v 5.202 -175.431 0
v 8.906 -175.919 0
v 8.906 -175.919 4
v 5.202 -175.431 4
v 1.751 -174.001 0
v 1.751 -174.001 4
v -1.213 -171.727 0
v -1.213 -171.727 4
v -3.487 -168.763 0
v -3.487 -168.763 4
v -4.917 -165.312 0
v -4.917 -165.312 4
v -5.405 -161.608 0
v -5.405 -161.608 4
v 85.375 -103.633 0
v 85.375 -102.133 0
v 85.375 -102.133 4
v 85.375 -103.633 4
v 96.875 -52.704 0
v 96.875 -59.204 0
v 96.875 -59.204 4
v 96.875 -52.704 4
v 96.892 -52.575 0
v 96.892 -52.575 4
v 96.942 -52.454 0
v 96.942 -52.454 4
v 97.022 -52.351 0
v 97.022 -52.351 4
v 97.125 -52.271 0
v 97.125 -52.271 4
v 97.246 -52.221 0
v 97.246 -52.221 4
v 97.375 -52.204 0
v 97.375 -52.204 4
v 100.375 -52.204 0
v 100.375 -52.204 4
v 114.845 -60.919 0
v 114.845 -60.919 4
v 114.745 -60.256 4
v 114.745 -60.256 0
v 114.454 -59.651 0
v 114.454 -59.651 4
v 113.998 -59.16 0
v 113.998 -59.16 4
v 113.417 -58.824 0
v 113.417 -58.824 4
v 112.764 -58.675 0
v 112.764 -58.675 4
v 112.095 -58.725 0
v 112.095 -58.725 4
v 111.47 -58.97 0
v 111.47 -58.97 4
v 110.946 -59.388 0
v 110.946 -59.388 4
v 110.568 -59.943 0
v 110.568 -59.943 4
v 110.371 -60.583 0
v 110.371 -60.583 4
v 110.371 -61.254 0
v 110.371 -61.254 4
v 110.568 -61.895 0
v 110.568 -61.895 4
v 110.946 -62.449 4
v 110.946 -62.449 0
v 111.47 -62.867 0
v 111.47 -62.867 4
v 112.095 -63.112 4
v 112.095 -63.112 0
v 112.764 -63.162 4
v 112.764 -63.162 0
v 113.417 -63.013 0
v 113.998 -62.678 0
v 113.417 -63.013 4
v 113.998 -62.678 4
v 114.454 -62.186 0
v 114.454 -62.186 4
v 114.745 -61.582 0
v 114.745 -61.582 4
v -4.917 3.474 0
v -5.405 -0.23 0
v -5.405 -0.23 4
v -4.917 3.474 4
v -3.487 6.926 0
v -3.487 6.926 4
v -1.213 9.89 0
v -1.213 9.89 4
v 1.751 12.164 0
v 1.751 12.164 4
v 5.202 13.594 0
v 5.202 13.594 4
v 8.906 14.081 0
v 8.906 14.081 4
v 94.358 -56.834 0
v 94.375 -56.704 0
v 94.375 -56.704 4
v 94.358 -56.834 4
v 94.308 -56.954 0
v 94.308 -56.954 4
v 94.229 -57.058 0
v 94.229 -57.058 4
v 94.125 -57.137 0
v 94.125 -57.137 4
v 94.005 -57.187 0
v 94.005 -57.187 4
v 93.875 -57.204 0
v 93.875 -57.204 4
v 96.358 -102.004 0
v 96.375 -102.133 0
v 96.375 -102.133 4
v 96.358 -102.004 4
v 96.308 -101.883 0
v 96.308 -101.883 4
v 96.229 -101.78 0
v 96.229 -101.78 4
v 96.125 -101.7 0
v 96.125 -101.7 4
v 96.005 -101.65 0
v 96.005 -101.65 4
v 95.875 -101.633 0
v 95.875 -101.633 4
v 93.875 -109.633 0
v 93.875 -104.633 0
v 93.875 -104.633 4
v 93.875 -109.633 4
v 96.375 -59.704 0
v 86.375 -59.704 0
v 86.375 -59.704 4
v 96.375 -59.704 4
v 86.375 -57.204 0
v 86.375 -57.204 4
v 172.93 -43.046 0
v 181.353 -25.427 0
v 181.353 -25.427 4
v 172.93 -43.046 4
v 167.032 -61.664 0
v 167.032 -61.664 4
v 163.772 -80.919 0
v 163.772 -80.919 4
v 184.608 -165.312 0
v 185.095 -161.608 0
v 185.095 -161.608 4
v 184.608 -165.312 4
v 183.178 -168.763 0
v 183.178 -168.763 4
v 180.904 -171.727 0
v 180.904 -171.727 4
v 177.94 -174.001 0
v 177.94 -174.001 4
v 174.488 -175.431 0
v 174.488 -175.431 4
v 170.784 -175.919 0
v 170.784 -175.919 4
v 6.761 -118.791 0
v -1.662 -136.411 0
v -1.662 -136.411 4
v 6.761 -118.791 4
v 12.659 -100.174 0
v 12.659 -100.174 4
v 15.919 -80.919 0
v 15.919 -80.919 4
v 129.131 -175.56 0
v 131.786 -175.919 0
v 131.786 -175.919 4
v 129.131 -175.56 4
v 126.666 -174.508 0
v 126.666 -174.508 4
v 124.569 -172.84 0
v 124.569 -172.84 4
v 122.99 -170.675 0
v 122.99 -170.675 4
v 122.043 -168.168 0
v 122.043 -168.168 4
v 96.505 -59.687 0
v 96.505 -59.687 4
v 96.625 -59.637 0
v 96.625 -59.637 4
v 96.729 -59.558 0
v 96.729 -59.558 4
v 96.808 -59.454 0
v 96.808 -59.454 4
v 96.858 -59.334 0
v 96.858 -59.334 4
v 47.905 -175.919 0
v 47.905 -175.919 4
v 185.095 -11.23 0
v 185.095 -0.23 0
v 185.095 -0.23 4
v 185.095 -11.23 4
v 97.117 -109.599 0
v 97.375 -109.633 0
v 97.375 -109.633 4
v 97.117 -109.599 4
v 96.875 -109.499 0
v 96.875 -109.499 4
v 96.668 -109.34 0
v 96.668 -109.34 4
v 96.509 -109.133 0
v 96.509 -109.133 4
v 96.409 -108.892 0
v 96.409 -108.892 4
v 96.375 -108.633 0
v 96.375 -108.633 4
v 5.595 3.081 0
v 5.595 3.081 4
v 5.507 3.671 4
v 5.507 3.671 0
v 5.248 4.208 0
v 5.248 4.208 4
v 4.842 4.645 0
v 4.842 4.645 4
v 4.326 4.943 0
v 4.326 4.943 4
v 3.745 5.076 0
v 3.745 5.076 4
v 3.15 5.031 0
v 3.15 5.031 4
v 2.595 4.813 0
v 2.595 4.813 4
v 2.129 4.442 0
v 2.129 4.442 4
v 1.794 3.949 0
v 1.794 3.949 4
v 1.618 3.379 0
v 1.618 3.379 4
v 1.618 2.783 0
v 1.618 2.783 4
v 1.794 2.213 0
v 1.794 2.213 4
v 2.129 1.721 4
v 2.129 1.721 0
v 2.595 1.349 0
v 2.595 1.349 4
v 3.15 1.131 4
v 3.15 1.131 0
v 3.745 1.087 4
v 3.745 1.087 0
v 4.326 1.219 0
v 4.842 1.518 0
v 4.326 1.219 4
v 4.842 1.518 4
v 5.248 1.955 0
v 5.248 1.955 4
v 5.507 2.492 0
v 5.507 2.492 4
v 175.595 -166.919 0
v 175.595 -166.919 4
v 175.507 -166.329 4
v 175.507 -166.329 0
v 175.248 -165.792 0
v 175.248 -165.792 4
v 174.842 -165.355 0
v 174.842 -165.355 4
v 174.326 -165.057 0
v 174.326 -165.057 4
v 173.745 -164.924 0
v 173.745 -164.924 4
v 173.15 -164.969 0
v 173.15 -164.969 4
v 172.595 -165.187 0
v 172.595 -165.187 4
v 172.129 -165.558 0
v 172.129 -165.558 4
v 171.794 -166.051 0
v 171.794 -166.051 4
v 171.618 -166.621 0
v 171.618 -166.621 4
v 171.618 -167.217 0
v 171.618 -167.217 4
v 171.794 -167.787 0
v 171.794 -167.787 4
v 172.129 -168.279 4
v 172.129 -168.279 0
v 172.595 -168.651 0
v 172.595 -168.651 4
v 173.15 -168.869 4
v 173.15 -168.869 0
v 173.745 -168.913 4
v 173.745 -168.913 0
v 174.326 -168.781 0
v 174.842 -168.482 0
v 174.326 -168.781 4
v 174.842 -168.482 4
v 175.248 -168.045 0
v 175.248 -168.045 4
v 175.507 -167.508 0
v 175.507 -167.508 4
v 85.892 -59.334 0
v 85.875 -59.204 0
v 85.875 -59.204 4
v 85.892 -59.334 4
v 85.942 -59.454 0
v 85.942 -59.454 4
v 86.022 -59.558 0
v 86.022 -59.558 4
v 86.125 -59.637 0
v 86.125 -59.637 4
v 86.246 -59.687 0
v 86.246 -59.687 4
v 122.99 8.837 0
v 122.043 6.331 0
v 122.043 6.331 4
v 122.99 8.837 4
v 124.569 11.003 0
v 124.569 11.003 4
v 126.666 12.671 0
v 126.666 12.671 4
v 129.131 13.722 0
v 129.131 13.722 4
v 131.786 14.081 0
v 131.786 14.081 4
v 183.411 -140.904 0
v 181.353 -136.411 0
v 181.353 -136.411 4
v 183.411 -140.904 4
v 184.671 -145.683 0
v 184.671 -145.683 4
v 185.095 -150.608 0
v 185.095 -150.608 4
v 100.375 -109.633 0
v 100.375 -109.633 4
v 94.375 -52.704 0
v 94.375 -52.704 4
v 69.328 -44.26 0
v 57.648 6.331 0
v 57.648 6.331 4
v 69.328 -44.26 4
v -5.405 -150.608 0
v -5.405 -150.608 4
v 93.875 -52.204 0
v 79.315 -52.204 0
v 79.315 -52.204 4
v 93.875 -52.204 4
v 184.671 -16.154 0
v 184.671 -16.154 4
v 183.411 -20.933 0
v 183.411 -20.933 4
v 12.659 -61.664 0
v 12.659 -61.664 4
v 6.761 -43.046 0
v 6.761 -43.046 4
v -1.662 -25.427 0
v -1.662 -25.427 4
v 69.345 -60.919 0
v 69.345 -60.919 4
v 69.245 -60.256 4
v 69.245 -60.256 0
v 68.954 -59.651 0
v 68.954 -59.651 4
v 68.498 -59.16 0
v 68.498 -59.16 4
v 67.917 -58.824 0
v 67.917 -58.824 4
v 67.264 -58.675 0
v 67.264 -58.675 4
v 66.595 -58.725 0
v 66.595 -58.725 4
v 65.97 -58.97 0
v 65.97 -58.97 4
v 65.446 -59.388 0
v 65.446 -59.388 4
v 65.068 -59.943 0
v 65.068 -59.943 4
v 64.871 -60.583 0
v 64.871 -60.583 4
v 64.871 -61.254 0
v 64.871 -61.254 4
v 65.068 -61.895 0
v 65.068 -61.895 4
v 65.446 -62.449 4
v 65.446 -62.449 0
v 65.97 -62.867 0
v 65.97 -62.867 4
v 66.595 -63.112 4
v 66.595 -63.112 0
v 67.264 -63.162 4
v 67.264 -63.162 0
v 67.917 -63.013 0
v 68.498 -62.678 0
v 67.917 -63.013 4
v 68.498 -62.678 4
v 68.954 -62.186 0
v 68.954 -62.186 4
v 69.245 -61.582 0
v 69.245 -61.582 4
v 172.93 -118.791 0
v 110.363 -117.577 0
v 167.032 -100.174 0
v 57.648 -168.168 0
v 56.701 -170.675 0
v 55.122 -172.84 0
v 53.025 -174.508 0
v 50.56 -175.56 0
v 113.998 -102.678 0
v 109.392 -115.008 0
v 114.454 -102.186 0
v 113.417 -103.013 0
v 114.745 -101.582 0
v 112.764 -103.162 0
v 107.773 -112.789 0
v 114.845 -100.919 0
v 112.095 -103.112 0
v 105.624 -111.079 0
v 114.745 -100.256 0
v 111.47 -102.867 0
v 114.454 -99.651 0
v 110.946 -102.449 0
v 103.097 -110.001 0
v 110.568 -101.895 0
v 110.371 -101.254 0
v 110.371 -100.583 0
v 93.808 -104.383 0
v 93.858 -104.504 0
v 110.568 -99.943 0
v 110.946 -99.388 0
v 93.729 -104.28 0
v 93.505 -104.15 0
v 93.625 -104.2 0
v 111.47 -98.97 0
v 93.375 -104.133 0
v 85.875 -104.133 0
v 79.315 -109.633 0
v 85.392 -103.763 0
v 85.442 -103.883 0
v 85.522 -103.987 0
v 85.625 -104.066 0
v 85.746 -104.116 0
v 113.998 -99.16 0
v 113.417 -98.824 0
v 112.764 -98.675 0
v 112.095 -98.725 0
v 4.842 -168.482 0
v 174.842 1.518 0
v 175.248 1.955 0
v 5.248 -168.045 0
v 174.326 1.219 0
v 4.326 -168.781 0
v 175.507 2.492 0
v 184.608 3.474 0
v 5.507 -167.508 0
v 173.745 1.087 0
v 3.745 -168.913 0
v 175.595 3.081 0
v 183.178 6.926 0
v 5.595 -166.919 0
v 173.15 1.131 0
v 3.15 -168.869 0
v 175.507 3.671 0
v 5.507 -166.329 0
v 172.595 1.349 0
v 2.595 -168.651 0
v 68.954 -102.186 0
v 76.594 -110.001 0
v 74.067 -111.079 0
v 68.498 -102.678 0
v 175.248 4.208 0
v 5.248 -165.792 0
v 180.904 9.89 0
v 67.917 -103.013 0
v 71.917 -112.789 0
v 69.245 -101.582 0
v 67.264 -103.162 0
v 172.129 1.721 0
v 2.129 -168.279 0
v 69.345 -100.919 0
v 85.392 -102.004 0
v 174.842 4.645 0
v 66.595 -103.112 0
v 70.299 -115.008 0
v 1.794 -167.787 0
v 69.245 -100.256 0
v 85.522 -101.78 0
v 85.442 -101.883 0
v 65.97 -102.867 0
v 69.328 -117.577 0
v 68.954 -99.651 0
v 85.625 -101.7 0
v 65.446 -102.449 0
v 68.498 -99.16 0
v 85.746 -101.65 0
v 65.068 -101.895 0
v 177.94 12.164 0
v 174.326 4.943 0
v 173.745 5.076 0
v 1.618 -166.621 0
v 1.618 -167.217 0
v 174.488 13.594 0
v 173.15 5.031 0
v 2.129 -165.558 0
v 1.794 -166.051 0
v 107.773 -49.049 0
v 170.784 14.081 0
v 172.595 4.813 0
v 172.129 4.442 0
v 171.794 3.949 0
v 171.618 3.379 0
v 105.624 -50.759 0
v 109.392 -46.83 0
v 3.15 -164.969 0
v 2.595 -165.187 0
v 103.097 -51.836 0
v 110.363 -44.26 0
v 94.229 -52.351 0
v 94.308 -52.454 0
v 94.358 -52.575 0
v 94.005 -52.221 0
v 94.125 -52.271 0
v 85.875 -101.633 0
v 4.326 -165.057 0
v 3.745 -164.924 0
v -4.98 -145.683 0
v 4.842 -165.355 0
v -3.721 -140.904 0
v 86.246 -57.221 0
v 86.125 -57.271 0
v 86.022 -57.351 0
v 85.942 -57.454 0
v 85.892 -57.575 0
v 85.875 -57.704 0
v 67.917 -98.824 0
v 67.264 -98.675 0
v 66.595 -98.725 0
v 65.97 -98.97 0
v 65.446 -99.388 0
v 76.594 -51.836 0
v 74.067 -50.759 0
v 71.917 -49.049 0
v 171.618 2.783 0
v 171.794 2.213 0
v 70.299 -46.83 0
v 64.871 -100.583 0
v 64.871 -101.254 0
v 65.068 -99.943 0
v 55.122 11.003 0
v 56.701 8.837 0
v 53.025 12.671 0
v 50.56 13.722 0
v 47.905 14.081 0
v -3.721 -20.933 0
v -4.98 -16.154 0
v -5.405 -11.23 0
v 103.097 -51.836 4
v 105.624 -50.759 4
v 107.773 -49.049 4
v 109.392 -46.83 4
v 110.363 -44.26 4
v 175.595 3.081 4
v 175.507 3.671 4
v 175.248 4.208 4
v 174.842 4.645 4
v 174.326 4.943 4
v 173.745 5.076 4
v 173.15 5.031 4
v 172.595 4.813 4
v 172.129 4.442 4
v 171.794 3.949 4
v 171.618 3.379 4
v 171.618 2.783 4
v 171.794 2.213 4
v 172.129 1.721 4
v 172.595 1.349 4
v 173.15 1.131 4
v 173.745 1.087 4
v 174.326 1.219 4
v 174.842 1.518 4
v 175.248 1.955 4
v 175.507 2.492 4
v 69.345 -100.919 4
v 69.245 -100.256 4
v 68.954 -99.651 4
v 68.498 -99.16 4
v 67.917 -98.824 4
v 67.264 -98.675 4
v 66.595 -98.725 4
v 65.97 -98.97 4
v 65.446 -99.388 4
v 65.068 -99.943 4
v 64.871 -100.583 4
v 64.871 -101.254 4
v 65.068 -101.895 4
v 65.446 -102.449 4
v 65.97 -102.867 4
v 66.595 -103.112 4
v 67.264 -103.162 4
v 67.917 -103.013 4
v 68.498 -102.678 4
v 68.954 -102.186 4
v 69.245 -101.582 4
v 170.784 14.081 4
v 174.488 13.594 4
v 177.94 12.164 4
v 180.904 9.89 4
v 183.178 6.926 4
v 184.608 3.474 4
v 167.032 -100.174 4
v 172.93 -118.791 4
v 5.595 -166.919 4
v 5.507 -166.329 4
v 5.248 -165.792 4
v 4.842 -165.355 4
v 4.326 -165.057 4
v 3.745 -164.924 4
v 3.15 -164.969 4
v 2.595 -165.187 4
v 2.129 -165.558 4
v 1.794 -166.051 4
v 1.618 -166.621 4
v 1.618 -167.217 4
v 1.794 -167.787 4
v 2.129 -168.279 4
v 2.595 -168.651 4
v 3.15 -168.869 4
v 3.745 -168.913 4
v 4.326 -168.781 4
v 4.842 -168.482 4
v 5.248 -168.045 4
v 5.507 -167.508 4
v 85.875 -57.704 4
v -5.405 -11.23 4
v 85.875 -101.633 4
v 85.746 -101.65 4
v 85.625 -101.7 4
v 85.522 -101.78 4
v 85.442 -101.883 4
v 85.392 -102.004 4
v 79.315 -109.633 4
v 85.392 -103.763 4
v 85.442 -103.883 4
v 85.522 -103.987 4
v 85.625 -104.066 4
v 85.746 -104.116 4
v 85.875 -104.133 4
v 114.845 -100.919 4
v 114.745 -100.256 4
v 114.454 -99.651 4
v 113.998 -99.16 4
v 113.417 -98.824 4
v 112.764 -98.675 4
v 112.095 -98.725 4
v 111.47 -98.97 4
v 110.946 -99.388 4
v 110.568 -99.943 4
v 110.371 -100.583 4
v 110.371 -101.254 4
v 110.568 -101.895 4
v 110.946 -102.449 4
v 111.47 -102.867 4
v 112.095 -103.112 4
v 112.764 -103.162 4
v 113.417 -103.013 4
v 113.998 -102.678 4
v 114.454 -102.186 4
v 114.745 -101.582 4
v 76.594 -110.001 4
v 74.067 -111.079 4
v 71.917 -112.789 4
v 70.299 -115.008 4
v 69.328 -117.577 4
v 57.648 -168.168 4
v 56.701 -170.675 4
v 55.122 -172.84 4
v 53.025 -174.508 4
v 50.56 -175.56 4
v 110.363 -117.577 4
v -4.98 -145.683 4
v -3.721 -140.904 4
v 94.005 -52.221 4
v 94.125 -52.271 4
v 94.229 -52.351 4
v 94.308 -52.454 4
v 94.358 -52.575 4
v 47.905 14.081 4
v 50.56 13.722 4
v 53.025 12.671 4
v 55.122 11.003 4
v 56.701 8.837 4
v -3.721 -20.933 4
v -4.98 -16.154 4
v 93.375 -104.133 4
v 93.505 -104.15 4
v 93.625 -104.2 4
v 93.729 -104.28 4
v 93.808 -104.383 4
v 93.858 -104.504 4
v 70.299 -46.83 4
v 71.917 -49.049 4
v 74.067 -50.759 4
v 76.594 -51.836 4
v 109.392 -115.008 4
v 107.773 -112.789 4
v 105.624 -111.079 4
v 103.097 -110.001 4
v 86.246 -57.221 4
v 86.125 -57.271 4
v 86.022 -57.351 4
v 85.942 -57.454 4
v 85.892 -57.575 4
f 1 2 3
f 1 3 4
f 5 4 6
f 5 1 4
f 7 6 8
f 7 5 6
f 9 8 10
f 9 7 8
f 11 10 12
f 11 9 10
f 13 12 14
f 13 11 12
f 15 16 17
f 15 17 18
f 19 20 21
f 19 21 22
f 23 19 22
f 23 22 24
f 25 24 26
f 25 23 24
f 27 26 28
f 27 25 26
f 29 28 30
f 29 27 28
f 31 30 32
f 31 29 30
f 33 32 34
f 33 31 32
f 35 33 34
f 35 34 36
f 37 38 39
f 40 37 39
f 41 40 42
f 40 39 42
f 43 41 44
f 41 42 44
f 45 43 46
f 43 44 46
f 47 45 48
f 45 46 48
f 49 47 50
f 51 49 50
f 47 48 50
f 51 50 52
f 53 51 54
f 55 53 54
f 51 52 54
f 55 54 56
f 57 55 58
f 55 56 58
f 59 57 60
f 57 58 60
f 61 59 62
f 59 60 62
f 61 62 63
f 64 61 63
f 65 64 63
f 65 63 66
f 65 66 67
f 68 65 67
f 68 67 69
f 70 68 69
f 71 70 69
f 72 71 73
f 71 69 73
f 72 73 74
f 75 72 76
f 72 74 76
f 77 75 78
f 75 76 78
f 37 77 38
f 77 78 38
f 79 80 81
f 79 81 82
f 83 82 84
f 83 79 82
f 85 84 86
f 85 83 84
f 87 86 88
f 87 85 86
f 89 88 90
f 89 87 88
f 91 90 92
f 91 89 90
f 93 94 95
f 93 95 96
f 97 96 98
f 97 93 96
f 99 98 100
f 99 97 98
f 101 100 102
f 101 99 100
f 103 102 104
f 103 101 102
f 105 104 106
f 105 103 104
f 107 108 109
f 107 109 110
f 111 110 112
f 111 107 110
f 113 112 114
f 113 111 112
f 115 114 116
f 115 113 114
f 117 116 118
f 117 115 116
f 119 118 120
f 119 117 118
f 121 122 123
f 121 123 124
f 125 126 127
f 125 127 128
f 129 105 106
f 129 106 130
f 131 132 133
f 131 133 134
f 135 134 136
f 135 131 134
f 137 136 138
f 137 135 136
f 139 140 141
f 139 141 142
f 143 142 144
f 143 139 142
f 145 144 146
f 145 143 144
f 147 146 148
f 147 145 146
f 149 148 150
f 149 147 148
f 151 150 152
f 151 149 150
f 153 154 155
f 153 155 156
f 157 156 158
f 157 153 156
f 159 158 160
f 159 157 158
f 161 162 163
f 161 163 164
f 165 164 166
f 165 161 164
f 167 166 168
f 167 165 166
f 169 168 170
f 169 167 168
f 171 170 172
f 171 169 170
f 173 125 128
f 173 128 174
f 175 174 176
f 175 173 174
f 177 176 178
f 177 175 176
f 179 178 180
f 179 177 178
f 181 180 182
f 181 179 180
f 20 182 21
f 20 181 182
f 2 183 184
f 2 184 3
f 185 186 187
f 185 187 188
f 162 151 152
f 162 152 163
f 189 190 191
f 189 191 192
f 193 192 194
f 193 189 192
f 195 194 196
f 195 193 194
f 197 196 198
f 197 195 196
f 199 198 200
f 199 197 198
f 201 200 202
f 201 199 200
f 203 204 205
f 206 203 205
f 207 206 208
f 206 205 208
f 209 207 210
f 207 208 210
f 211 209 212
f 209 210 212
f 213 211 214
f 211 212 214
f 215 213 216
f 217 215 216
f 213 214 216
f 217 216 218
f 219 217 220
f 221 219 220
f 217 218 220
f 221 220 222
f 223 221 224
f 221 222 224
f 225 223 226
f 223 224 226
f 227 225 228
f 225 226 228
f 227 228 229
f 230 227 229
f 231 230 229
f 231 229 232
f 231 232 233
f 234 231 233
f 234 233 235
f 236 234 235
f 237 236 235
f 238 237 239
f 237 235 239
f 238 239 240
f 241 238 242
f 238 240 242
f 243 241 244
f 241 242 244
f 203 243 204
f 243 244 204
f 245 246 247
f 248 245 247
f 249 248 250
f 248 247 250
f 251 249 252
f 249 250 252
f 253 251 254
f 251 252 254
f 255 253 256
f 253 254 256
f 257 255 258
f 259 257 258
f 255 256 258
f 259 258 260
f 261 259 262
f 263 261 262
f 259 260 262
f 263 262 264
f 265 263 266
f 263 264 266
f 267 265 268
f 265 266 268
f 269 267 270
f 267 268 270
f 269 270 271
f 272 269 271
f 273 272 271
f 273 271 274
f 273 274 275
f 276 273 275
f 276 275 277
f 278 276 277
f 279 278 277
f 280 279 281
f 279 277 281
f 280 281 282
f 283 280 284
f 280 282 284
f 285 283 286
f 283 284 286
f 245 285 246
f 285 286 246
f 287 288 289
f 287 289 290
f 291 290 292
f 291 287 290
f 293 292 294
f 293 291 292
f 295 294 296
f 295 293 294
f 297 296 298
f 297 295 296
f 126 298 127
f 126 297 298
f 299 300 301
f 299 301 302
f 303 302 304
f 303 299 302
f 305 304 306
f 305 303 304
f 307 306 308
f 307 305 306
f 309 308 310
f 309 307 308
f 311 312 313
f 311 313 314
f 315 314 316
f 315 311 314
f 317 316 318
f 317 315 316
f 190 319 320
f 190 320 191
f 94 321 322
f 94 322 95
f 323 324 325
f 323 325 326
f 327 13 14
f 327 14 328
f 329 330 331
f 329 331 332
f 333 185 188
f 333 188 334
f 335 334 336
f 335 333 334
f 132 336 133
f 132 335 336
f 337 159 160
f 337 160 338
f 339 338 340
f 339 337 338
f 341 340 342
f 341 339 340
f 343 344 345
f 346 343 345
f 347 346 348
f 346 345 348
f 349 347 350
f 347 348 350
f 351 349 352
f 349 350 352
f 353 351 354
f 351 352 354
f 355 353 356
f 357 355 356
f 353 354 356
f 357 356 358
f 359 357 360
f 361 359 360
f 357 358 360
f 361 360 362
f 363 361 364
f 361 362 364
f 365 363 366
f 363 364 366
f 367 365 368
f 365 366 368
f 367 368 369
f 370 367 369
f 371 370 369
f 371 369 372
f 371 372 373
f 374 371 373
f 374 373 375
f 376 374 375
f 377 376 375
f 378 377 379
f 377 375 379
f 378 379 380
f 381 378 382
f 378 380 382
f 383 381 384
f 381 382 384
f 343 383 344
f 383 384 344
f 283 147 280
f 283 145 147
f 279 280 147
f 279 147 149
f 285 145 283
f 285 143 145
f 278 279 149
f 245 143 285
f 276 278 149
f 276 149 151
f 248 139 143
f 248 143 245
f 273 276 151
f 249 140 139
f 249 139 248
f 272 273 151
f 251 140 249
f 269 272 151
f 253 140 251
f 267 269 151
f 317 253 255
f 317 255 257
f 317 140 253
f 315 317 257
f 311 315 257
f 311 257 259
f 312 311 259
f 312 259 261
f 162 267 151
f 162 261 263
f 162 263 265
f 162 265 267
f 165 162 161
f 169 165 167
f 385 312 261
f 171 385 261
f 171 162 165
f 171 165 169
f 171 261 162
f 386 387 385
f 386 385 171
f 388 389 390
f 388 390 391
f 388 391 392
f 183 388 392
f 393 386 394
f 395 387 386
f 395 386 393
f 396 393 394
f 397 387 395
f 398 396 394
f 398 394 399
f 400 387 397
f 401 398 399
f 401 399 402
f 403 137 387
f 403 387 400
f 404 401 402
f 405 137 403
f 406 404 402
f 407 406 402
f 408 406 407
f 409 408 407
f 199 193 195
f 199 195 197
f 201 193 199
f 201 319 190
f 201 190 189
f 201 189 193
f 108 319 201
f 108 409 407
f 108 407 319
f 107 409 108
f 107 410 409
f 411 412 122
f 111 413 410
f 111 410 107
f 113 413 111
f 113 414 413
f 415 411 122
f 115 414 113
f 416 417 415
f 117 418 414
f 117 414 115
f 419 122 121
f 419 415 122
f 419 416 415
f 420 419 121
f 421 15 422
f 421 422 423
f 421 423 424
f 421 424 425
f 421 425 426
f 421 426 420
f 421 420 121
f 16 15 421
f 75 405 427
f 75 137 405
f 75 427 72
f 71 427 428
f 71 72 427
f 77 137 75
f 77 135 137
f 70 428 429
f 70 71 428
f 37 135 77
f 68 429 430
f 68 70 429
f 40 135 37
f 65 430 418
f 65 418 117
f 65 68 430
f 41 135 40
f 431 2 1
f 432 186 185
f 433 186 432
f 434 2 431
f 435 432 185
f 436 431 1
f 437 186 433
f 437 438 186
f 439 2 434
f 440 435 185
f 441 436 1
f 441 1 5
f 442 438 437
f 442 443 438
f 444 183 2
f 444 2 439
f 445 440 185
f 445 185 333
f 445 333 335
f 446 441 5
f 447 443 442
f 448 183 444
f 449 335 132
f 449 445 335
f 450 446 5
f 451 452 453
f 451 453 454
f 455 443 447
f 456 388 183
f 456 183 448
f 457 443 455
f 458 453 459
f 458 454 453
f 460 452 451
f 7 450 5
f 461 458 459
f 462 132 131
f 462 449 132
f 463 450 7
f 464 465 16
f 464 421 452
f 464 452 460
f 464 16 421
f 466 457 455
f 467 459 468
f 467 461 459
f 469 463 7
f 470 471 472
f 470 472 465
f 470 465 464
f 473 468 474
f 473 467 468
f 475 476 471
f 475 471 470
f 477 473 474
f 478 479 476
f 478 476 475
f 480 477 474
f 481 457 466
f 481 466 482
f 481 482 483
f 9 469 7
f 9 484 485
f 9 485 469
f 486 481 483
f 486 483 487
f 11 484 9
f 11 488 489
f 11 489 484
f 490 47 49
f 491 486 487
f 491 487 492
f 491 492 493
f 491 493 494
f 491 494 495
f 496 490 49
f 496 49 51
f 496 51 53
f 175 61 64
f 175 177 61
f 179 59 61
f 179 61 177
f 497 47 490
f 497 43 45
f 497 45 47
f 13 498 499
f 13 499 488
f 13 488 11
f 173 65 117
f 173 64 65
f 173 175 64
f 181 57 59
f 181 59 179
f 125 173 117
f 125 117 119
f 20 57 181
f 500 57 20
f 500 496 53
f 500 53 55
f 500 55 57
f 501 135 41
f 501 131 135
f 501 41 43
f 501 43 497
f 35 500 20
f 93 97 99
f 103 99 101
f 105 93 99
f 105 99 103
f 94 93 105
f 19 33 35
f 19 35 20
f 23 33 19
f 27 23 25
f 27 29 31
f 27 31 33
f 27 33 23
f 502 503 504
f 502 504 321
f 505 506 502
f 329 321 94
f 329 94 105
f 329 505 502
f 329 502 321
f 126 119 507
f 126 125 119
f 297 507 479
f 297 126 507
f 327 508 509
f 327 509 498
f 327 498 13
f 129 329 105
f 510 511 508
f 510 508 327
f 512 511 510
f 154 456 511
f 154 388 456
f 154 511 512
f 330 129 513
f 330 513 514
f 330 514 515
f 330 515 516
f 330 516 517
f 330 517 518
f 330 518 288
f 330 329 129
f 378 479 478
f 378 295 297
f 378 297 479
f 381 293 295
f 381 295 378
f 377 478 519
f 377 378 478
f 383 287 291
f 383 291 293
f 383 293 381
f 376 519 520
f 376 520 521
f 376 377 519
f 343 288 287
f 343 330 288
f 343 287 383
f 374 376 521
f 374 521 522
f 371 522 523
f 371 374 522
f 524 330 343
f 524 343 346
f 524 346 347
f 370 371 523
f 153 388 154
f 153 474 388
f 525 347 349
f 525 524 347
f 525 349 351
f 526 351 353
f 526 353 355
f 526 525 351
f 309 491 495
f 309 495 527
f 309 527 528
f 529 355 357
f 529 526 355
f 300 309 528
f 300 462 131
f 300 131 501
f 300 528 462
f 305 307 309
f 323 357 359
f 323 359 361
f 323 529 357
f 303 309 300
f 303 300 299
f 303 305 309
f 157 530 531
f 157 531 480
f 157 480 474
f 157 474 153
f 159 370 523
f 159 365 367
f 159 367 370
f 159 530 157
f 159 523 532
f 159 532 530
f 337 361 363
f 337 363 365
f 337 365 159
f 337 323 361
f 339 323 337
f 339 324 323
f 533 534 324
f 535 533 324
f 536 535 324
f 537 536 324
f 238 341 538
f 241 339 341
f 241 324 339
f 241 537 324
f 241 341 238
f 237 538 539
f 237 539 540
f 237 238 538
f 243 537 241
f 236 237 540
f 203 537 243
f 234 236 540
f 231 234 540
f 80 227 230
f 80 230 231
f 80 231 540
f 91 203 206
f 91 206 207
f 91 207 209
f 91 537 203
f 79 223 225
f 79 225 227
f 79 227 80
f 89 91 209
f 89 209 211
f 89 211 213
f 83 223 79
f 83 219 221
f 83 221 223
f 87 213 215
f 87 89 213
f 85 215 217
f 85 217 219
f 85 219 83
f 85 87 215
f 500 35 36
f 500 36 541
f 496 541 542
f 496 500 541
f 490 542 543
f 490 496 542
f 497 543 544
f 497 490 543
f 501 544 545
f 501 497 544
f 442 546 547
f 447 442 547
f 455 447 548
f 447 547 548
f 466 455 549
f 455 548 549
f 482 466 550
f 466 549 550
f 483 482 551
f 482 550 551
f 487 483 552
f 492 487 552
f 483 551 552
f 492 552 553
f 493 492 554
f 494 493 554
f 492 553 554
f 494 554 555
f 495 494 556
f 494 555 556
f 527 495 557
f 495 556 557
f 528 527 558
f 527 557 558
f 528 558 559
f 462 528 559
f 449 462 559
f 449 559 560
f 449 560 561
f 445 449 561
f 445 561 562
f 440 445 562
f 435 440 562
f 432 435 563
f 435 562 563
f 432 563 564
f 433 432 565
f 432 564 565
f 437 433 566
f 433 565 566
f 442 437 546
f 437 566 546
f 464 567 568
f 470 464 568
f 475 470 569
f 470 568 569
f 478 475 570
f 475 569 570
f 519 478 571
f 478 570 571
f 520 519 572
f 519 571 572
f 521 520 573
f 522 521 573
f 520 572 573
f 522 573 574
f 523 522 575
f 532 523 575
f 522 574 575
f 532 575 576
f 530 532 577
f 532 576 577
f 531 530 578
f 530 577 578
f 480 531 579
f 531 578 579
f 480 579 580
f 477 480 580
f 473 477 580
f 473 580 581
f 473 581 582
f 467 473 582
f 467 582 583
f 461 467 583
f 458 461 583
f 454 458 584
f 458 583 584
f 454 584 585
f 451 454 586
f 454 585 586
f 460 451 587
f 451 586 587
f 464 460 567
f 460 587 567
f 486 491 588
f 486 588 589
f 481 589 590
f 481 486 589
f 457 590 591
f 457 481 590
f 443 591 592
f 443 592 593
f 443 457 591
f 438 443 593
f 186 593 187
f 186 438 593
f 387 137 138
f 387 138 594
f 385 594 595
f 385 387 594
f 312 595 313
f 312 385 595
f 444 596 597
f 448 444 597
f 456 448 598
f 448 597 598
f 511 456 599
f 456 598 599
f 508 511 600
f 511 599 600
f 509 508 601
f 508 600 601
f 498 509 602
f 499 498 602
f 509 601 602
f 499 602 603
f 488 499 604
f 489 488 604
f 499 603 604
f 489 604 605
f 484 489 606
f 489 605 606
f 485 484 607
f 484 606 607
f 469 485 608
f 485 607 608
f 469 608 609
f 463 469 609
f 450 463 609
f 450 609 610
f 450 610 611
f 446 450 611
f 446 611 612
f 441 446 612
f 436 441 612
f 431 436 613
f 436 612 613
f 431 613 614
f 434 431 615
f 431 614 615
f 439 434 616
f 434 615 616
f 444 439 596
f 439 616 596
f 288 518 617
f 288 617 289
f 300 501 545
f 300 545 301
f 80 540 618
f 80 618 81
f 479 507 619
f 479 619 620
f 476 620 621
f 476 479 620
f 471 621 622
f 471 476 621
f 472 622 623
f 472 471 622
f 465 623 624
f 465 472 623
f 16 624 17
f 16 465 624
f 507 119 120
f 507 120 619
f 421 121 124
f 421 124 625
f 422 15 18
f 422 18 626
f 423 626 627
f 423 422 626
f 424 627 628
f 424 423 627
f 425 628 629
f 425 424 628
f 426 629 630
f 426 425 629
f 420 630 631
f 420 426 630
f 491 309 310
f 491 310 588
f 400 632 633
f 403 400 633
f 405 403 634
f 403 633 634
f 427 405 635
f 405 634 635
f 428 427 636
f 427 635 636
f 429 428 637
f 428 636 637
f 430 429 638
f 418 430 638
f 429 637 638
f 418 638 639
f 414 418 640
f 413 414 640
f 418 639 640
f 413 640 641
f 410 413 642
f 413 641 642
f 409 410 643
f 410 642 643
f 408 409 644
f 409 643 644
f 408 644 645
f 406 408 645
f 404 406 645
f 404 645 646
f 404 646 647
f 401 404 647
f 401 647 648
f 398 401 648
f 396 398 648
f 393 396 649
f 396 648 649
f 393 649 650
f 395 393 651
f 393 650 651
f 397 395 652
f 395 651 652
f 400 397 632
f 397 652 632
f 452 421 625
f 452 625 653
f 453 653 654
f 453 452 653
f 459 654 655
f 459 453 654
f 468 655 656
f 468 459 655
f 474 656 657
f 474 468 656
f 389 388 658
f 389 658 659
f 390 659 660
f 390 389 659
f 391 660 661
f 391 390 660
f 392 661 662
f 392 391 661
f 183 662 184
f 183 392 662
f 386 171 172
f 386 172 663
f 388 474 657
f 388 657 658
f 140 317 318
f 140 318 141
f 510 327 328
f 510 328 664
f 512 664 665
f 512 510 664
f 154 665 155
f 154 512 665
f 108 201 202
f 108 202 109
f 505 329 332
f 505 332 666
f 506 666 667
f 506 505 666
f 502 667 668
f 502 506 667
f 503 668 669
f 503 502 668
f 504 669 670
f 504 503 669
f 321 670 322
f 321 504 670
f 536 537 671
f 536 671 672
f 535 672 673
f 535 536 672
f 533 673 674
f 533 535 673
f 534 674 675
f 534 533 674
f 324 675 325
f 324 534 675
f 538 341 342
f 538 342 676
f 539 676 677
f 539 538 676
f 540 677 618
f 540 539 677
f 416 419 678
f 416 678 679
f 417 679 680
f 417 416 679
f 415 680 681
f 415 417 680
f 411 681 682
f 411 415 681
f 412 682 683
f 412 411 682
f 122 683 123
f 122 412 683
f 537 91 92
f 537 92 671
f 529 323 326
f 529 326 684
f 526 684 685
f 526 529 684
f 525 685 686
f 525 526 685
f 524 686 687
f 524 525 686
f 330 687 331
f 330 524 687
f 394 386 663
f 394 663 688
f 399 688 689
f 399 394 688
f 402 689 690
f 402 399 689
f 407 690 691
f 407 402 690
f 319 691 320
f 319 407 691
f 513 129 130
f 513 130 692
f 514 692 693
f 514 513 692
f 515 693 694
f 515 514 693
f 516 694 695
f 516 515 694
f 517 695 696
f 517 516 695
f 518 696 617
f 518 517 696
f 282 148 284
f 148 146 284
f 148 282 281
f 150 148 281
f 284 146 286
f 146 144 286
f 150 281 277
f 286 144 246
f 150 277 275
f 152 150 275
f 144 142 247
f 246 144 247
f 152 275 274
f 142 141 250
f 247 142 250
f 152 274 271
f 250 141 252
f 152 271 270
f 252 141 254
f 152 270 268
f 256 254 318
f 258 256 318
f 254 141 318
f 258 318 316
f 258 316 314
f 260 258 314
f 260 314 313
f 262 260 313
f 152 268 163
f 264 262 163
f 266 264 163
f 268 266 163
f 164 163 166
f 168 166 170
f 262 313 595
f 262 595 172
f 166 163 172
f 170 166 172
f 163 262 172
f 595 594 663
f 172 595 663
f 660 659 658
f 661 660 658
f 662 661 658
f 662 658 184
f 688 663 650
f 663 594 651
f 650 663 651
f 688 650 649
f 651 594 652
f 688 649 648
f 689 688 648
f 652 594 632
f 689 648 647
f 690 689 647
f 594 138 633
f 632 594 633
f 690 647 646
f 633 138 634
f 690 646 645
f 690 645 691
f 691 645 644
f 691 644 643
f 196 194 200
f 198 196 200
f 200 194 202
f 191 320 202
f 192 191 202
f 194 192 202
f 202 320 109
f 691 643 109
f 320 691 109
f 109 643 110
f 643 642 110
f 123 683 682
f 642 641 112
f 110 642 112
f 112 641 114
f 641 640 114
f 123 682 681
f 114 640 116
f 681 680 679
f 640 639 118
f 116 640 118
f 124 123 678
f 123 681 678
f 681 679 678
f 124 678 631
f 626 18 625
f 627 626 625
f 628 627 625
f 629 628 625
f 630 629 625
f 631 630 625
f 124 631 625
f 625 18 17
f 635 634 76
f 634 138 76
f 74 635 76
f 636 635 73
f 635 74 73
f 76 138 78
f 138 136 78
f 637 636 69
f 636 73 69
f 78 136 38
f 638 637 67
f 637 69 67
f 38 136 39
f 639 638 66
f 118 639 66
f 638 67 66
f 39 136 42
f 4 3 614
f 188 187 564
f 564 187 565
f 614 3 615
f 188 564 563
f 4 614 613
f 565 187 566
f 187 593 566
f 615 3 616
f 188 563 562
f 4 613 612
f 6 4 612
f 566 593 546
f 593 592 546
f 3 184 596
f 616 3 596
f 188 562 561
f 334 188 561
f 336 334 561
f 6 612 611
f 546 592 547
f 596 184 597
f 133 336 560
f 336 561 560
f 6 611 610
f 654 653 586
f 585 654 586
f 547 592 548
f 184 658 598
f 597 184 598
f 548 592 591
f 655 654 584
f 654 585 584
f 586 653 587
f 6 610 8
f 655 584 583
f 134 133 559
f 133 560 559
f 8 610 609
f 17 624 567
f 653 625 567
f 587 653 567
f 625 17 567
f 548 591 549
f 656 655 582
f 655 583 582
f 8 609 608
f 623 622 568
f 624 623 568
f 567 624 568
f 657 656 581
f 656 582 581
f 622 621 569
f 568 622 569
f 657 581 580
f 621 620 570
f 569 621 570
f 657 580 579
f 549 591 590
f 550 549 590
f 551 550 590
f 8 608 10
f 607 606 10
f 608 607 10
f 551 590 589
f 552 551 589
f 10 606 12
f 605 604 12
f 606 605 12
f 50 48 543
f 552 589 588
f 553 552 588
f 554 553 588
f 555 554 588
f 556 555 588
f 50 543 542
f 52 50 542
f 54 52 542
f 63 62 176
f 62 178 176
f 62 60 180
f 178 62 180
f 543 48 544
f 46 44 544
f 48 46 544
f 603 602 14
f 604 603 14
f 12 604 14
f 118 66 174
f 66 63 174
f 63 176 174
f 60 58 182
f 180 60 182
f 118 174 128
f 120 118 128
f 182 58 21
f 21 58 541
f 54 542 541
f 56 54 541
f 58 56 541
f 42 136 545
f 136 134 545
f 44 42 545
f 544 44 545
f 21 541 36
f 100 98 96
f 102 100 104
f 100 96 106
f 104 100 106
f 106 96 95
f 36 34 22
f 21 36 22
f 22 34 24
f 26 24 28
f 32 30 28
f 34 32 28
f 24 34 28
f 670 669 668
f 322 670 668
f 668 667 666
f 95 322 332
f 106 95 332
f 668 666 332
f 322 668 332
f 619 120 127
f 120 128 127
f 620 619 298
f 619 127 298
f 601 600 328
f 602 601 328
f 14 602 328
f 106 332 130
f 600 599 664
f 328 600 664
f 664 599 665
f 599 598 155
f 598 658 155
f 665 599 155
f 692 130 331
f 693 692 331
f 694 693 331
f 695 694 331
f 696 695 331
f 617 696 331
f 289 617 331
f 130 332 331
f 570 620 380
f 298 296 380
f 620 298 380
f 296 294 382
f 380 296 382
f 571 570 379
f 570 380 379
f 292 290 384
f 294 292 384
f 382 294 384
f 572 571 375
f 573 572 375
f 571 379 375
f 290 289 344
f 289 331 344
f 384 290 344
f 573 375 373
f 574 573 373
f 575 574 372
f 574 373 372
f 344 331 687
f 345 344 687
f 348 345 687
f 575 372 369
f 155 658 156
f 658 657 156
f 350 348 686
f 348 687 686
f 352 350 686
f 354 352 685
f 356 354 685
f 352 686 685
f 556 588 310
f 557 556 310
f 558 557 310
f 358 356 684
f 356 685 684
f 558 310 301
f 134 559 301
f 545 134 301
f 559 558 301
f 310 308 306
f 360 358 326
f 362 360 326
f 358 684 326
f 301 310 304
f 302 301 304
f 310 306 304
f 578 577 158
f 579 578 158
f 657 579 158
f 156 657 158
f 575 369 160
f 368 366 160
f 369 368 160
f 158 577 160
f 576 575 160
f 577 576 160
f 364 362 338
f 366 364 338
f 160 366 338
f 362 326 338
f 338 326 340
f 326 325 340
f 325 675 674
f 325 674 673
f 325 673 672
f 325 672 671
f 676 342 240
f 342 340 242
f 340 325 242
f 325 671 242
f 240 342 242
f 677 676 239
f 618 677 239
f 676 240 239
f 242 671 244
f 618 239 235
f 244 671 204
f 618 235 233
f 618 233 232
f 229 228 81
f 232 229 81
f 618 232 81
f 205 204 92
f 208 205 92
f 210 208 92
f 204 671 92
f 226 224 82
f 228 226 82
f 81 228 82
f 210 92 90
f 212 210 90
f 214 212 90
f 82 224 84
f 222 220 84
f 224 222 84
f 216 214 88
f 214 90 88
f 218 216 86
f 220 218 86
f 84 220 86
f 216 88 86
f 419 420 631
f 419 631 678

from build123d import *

# Parameters (mm, degrees)
BOSS_EXTRUDE1_DEPTH = 4
SKETCH3_R           = 2
SKETCH3_R_2         = 2.25
CUT_EXTRUDE1_DEPTH  = 4


with BuildPart() as part:
    # Sketch2 → Boss-Extrude1 (new body)
    with BuildSketch(Plane.XY):
        with BuildLine():
            Line((94.375415976, -52.704406223), (94.375415976, -56.704406223))
            ThreePointArc((94.375415976, -56.704406223), (94.228969367, -57.057959614), (93.875415976, -57.204406223))
            Line((93.875415976, -57.204406223), (86.375415976, -57.204406223))
            ThreePointArc((86.375415976, -57.204406223), (86.021862586, -57.350852833), (85.875415976, -57.704406223))
            Line((85.875415976, -57.704406223), (85.875415976, -59.204406223))
            ThreePointArc((85.875415976, -59.204406223), (86.021862586, -59.557959614), (86.375415976, -59.704406223))
            Line((86.375415976, -59.704406223), (96.375415976, -59.704406223))
            ThreePointArc((96.375415976, -59.704406223), (96.728969367, -59.557959614), (96.875415976, -59.204406223))
            Line((96.875415976, -59.204406223), (96.875415976, -52.704406223))
            ThreePointArc((96.875415976, -52.704406223), (97.021862586, -52.350852833), (97.375415976, -52.204406223))
            Line((97.375415976, -52.204406223), (100.375415976, -52.204406223))
            ThreePointArc((100.375415976, -52.204406223), (106.756191002, -49.976139831), (110.36270914, -44.260154531))
            Line((110.36270914, -44.260154531), (122.04253828, 6.330743606))
            ThreePointArc((122.04253828, 6.330743606), (125.561092562, 11.907314631), (131.786238928, 14.081233063))
            Line((131.786238928, 14.081233063), (170.7844924, 14.081233063))
            ThreePointArc((170.7844924, 14.081233063), (180.903868338, 9.889650306), (185.095451094, -0.229725632))
            Line((185.095451094, -0.229725632), (185.095451094, -11.229725632))
            ThreePointArc((185.095451094, -11.229725632), (184.144121557, -18.570812299), (181.352982104, -25.42691337))
            ThreePointArc((181.352982104, -25.42691337), (169.65700257, -52.25234878), (163.771733482, -80.918766937))
            ThreePointArc((163.771733482, -80.918766937), (169.65700257, -109.585185095), (181.352982104, -136.410620505))
            ThreePointArc((181.352982104, -136.410620505), (184.144121557, -143.266721576), (185.095451094, -150.607808243))
            Line((185.095451094, -150.607808243), (185.095451094, -161.607808243))
            ThreePointArc((185.095451094, -161.607808243), (180.903868338, -171.727184181), (170.7844924, -175.918766937))
            Line((170.7844924, -175.918766937), (131.786238928, -175.918766937))
            ThreePointArc((131.786238928, -175.918766937), (125.561092562, -173.744848506), (122.04253828, -168.168277481))
            Line((122.04253828, -168.168277481), (110.36270914, -117.577379344))
            ThreePointArc((110.36270914, -117.577379344), (106.756191002, -111.861394044), (100.375415976, -109.633127651))
            Line((100.375415976, -109.633127651), (97.375415976, -109.633127651))
            ThreePointArc((97.375415976, -109.633127651), (96.668309195, -109.340234433), (96.375415976, -108.633127651))
            Line((96.375415976, -108.633127651), (96.375415976, -102.133127651))
            ThreePointArc((96.375415976, -102.133127651), (96.228969367, -101.779574261), (95.875415976, -101.633127651))
            Line((95.875415976, -101.633127651), (85.875415976, -101.633127651))
            ThreePointArc((85.875415976, -101.633127651), (85.521862586, -101.779574261), (85.375415976, -102.133127651))
            Line((85.375415976, -102.133127651), (85.375415976, -103.633127651))
            ThreePointArc((85.375415976, -103.633127651), (85.521862586, -103.986681042), (85.875415976, -104.133127651))
            Line((85.875415976, -104.133127651), (93.375415976, -104.133127651))
            ThreePointArc((93.375415976, -104.133127651), (93.728969367, -104.279574261), (93.875415976, -104.633127651))
            Line((93.875415976, -104.633127651), (93.875415976, -108.633127651))
            Line((93.875415976, -108.633127651), (93.875415976, -109.633127651))
            Line((93.875415976, -109.633127651), (82.315486211, -109.633127651))
            Line((82.315486211, -109.633127651), (79.315486211, -109.633127651))
            ThreePointArc((79.315486211, -109.633127651), (72.934711186, -111.861394044), (69.328193047, -117.577379344))
            Line((69.328193047, -117.577379344), (57.648363907, -168.168277481))
            ThreePointArc((57.648363907, -168.168277481), (54.129809626, -173.744848506), (47.904663259, -175.918766937))
            Line((47.904663259, -175.918766937), (8.906409788, -175.918766937))
            ThreePointArc((8.906409788, -175.918766937), (-1.21296615, -171.727184181), (-5.404548906, -161.607808243))
            Line((-5.404548906, -161.607808243), (-5.404548906, -150.607808243))
            ThreePointArc((-5.404548906, -150.607808243), (-4.453219369, -143.266721576), (-1.662079916, -136.410620505))
            ThreePointArc((-1.662079916, -136.410620505), (10.033899618, -109.585185095), (15.919168706, -80.918766937))
            ThreePointArc((15.919168706, -80.918766937), (10.033899618, -52.25234878), (-1.662079916, -25.42691337))
            ThreePointArc((-1.662079916, -25.42691337), (-4.453219369, -18.570812299), (-5.404548906, -11.229725632))
            Line((-5.404548906, -11.229725632), (-5.404548906, -0.229725632))
            ThreePointArc((-5.404548906, -0.229725632), (-1.21296615, 9.889650306), (8.906409788, 14.081233063))
            Line((8.906409788, 14.081233063), (47.904663259, 14.081233063))
            ThreePointArc((47.904663259, 14.081233063), (54.129809626, 11.907314631), (57.648363907, 6.330743606))
            Line((57.648363907, 6.330743606), (69.328193047, -44.260154531))
            ThreePointArc((69.328193047, -44.260154531), (72.934711186, -49.976139831), (79.315486211, -52.204406223))
            Line((79.315486211, -52.204406223), (82.315486211, -52.204406223))
            Line((82.315486211, -52.204406223), (93.875415976, -52.204406223))
            ThreePointArc((93.875415976, -52.204406223), (94.228969367, -52.350852833), (94.375415976, -52.704406223))
        make_face()
    extrude(amount=BOSS_EXTRUDE1_DEPTH)

    # Sketch3 → Cut-Extrude1 (cut)
    with BuildSketch(Plane.XY.offset(4)):
        with Locations((3.595451094, 3.081233063)):
            Circle(SKETCH3_R)
        with Locations((3.595451094, -166.918766937)):
            Circle(SKETCH3_R)
        with Locations((67.095451094, -60.918766937)):
            Circle(SKETCH3_R_2)
        with Locations((112.595451094, -60.918766937)):
            Circle(SKETCH3_R_2)
        with Locations((67.095451094, -100.918766947)):
            Circle(SKETCH3_R_2)
        with Locations((112.595451094, -100.918766947)):
            Circle(SKETCH3_R_2)
        with Locations((173.595451094, -166.918766937)):
            Circle(SKETCH3_R)
        with Locations((173.595451094, 3.081233063)):
            Circle(SKETCH3_R)
    extrude(amount=-CUT_EXTRUDE1_DEPTH, mode=Mode.SUBTRACT)


solid = part.part
